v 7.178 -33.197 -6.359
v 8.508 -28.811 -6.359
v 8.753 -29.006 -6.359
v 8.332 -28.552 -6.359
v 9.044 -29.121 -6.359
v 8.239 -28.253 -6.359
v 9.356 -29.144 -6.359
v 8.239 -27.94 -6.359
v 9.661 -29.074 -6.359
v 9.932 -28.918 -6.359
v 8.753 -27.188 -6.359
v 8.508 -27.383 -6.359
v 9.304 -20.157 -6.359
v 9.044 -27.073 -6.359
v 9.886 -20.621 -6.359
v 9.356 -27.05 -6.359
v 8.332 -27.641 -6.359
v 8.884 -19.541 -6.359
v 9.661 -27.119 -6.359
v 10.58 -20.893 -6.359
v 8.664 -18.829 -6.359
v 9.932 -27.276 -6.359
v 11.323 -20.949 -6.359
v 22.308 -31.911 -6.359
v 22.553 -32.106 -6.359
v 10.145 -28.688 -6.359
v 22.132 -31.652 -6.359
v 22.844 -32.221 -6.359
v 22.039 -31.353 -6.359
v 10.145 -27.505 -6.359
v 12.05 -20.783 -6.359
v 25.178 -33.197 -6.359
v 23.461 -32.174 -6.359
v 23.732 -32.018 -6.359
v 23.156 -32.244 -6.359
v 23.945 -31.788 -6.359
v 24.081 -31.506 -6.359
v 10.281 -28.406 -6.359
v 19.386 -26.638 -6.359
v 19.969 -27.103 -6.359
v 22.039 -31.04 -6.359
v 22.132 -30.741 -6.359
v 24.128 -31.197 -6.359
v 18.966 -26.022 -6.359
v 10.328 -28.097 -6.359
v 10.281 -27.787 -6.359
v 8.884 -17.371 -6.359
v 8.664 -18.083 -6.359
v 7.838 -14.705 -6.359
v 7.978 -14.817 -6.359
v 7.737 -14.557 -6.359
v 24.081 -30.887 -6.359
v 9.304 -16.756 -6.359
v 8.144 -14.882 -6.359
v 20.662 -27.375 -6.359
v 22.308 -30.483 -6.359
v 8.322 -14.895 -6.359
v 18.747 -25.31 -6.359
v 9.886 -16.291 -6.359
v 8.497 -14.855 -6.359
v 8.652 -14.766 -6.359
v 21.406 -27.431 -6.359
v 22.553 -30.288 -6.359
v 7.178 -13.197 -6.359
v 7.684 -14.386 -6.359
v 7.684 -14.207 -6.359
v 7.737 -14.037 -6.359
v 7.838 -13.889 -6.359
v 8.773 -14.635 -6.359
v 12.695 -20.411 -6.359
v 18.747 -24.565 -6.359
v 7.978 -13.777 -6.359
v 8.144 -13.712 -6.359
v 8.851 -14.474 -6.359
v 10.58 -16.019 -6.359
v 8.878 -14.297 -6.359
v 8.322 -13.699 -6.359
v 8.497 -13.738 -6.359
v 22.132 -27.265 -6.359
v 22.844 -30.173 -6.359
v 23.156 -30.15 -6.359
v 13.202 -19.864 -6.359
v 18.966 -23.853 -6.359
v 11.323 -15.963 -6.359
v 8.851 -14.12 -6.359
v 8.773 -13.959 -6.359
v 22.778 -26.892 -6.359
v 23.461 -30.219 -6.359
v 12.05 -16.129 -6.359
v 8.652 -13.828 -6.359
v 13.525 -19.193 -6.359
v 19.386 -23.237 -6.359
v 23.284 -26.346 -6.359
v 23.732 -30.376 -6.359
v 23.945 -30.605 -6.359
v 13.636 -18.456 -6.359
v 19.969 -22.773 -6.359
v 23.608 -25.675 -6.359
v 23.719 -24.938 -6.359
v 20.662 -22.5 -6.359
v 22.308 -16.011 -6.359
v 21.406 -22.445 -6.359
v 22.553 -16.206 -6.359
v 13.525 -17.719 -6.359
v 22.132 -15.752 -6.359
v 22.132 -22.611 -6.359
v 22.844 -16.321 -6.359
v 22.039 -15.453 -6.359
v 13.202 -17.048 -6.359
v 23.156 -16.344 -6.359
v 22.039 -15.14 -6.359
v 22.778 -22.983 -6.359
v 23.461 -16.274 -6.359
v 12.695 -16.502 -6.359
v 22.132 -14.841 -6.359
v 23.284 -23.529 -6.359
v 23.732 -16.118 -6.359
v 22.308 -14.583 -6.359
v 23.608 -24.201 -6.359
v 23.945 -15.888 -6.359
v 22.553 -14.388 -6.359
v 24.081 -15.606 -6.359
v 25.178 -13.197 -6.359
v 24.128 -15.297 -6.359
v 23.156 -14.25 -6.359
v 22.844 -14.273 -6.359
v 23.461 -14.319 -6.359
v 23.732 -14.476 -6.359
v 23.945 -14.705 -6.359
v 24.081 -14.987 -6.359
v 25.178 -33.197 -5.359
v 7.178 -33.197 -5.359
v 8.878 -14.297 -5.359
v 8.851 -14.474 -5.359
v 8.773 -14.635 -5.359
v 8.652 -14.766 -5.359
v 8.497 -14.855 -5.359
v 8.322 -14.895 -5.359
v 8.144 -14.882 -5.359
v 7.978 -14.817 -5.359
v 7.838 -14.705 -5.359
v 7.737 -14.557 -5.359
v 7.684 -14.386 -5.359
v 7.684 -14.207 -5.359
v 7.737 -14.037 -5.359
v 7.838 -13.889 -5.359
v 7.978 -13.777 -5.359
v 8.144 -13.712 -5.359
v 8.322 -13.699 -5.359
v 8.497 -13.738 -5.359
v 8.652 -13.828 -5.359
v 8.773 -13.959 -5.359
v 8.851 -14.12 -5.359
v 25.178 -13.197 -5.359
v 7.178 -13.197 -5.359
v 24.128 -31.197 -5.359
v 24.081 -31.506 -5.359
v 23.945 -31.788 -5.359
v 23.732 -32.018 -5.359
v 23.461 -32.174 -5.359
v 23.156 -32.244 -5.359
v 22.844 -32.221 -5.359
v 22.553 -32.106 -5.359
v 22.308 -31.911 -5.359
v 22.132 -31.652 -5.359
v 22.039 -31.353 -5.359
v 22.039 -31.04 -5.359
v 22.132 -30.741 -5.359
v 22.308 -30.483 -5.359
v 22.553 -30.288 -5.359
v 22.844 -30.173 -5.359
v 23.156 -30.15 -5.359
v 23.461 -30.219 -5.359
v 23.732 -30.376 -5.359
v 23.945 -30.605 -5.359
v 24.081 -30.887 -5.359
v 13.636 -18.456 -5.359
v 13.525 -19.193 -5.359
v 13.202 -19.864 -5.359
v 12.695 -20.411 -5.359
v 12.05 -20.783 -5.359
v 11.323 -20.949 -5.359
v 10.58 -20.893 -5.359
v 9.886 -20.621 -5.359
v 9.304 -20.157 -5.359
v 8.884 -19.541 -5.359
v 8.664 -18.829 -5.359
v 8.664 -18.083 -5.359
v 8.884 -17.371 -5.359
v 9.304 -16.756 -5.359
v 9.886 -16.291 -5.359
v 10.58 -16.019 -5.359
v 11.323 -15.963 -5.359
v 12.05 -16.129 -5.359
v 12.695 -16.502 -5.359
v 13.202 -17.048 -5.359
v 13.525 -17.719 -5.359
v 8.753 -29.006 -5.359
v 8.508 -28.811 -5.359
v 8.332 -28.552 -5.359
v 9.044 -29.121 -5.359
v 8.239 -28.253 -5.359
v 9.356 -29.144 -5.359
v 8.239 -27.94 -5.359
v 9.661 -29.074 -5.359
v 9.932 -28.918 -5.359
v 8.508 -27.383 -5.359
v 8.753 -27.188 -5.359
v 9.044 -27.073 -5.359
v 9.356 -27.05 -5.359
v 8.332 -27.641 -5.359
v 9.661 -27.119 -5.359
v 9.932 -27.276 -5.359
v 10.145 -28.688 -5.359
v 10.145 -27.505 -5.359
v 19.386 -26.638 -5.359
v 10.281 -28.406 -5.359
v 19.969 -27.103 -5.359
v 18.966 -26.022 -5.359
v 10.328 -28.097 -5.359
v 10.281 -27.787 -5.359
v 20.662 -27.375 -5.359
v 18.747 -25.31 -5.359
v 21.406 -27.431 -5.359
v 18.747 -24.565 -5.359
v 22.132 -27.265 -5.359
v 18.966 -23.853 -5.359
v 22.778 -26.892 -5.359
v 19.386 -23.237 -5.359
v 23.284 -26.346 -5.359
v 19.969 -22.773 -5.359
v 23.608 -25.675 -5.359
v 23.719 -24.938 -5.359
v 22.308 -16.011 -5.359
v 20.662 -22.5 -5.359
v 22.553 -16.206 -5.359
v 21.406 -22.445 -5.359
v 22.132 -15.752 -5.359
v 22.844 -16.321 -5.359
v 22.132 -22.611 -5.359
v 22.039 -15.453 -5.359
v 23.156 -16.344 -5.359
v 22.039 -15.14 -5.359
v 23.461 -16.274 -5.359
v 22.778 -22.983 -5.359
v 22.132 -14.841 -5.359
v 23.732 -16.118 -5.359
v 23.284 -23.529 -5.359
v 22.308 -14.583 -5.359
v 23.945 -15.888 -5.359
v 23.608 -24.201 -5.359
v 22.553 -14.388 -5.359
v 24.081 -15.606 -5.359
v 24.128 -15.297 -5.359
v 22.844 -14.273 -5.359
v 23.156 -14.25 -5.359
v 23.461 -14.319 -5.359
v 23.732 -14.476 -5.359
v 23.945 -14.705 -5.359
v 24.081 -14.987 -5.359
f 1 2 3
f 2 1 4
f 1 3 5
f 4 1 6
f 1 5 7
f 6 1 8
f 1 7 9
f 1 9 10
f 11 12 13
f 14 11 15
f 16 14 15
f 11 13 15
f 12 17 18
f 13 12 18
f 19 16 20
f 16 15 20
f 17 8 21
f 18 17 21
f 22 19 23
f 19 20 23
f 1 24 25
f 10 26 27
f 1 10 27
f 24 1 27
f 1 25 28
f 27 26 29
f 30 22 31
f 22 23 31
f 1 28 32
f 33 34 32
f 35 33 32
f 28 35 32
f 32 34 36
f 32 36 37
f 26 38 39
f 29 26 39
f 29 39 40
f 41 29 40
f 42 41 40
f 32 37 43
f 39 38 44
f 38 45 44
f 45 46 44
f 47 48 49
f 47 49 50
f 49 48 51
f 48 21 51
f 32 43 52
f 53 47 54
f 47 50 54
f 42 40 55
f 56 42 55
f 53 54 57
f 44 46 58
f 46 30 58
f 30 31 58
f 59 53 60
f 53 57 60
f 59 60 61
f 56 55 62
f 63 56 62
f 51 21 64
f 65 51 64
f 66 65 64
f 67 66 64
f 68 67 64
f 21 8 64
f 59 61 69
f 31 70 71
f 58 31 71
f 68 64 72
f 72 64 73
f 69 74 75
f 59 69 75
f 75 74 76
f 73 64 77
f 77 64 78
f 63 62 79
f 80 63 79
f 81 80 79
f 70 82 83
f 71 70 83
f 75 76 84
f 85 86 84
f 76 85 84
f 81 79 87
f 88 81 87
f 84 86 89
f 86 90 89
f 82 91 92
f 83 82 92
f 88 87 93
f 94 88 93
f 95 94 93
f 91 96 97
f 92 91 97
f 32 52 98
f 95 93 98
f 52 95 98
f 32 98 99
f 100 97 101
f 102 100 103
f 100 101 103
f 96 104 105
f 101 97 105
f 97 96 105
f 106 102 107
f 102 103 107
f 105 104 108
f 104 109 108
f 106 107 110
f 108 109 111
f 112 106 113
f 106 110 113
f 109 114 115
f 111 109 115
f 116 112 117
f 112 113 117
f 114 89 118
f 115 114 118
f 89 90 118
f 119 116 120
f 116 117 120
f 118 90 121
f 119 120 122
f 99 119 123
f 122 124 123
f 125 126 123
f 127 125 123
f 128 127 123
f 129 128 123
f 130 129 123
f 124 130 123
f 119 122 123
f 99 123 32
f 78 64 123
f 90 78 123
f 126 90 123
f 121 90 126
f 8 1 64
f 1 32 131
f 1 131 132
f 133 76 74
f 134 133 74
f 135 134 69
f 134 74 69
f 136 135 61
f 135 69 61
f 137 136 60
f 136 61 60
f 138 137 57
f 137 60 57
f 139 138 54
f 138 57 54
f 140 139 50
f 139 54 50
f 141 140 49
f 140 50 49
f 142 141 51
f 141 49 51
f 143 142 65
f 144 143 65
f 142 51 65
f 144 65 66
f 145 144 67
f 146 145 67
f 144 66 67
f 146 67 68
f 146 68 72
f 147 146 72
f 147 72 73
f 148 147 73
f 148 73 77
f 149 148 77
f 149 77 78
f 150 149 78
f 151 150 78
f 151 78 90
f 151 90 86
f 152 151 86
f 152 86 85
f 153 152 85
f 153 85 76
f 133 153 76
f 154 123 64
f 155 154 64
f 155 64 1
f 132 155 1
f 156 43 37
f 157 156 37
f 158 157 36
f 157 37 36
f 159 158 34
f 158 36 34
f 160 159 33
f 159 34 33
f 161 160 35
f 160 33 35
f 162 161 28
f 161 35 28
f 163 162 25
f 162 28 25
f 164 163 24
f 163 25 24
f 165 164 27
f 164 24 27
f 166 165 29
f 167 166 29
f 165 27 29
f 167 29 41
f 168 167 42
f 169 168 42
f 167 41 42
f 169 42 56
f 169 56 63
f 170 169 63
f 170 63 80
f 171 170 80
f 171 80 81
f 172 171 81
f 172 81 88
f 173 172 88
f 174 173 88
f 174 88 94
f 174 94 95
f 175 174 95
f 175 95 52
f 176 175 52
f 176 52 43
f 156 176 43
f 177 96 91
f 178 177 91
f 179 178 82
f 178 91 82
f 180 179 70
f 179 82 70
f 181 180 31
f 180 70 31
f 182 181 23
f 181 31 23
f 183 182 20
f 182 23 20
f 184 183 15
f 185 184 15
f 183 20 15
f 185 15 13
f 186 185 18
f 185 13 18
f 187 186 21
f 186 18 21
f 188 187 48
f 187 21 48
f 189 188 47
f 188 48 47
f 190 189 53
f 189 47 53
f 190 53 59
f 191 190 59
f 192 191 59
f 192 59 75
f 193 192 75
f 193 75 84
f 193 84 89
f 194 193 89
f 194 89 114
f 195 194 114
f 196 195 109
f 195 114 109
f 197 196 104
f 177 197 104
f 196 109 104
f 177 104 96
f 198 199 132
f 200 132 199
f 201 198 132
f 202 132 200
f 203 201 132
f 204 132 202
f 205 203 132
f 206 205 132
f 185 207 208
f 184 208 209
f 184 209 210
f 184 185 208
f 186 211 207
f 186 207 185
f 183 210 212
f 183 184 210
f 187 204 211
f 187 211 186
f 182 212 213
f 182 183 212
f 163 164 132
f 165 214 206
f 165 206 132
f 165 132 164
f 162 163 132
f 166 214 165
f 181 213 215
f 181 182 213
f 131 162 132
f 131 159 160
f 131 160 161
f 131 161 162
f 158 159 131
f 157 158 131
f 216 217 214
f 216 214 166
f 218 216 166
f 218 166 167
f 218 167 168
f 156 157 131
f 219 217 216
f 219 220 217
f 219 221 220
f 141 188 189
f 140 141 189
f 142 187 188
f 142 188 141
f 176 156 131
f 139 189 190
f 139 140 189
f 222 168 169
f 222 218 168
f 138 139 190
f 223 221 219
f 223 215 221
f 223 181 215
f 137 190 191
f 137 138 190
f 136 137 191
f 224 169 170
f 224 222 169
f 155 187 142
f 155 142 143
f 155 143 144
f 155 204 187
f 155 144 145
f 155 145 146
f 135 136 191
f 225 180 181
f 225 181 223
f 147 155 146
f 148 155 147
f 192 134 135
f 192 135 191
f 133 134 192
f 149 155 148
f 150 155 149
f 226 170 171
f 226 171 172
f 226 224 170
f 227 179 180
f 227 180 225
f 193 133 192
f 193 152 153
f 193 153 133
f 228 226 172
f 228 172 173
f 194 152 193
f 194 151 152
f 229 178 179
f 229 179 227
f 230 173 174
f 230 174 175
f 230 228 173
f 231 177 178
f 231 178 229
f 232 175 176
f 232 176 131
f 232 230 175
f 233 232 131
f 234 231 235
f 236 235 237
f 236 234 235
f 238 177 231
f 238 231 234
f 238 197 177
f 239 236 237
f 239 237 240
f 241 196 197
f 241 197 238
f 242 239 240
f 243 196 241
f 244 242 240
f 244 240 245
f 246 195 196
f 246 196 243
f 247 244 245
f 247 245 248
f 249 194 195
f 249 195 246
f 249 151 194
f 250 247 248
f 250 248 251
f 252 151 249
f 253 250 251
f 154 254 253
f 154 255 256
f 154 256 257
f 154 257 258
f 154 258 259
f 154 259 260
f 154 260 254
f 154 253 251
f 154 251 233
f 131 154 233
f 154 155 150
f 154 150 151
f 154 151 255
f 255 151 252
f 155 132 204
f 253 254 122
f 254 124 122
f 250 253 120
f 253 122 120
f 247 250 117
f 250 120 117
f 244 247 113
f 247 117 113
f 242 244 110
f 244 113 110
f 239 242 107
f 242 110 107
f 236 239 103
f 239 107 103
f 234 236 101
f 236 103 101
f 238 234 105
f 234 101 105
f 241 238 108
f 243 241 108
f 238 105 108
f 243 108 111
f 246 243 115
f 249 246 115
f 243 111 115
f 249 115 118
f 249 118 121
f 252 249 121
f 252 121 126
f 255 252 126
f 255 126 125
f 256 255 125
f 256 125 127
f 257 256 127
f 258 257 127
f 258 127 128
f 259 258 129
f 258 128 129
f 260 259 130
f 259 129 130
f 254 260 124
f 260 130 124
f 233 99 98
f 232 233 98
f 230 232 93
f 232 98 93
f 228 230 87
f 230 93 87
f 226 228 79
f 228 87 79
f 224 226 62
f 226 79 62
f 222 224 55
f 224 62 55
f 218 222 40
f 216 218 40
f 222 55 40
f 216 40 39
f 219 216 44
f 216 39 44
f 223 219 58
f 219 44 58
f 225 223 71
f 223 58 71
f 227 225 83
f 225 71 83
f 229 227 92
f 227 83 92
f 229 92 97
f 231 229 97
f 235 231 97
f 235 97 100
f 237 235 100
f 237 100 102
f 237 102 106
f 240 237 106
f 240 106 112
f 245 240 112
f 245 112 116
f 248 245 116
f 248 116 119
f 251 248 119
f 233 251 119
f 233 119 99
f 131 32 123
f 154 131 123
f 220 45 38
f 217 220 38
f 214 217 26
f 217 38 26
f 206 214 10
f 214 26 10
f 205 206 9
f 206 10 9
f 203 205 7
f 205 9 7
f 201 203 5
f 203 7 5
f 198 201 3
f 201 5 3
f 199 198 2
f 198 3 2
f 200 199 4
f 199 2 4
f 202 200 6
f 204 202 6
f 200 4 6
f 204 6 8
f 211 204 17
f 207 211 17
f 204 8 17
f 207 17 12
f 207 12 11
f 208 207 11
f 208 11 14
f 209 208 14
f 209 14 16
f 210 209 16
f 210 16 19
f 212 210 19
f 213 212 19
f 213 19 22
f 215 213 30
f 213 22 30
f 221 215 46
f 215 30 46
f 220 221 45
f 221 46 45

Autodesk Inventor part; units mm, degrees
ref_plane "YZ Plane" through (0, 0, 0) normal (1, 0, 0) x (0, 1, 0)
ref_plane "XZ Plane" through (0, 0, 0) normal (0, 1, 0) x (-1, 0, 0)
ref_plane "Work Plane1" through (-8, -18, 2.25) normal (0, 0, 1) x (1, 0, 0)
ref_plane "Work Plane2" through (16.1776, -21.6969, -6.3588) normal (0, 0, 1) x (1, 0, 0)
sketch "Sketch6" plane through (16.1776, -21.6969, -6.3588) normal (0, 0, 1) x (1, 0, 0)
  circle A0 centre (6.9, -9.5) radius 1.2 projected
  circle A1 centre (-6.9, -6.4) radius 1.2 projected
  circle A2 centre (6.9, 6.4) radius 1.2 projected
  circle A3 centre (-7.9, 7.4) radius 0.4 projected
  line L0 (4.2, -7) -> (-1.2, -7) projected
  arc A4 (-8.5, 0.3) -> (-1.2, -7) centre (-1.2, 0.3) ccw projected
  line L1 (-8.5, 0.3) -> (-8.5, 2.7) projected
  arc A5 (-4.2, 7) -> (-8.5, 2.7) centre (-4.2, 2.7) ccw projected
  line L2 (-4.2, 7) -> (1.2, 7) projected
  arc A6 (8.5, -0.3) -> (1.2, 7) centre (1.2, -0.3) ccw projected
  line L3 (8.5, -0.3) -> (8.5, -2.7) projected
  arc A7 (4.2, -7) -> (8.5, -2.7) centre (4.2, -2.7) ccw projected
  line L4 (-4.2738, -7.5) -> (-4.2738, -24.5) projected
  line L5 (-4.2738, -7.5) -> (4.2738, -7.5) projected
  line L6 (4.2738, -24.5) -> (4.2738, -7.5) projected
  line L7 (9, -24.5) -> (4.2738, -24.5) projected
  line L8 (9, -24.5) -> (9, 8.5) projected
  line L9 (9, 8.5) -> (-9, 8.5) projected
  line L10 (-9, 8.5) -> (-9, -24.5) projected
  line L11 (-4.2738, -24.5) -> (-9, -24.5) projected
  line L12 (1.2, 6.2) -> (-4.2, 6.2) projected
  arc A8 (-4.2, 6.2) -> (-7.7, 2.7) centre (-4.2, 2.7) ccw projected
  line L13 (-7.7, 2.7) -> (-7.7, 0.3) projected
  arc A9 (-7.7, 0.3) -> (-1.2, -6.2) centre (-1.2, 0.3) ccw projected
  line L14 (-1.2, -6.2) -> (4.2, -6.2) projected
  arc A10 (4.2, -6.2) -> (7.7, -2.7) centre (4.2, -2.7) ccw projected
  line L15 (7.7, -2.7) -> (7.7, -0.3) projected
  arc A11 (7.7, -0.3) -> (1.2, 6.2) centre (1.2, -0.3) ccw projected
  line L16 (-7.2, 0.3) -> (-7.2, 2.7) projected
  arc A12 (-4.2, 5.7) -> (-7.2, 2.7) centre (-4.2, 2.7) ccw projected
  line L17 (-4.2, 5.7) -> (1.2, 5.7) projected
  arc A13 (7.2, -0.3) -> (1.2, 5.7) centre (1.2, -0.3) ccw projected
  line L18 (7.2, -0.3) -> (7.2, -2.7) projected
  arc A14 (4.2, -5.7) -> (7.2, -2.7) centre (4.2, -2.7) ccw projected
  line L19 (4.2, -5.7) -> (-1.2, -5.7) projected
  arc A15 (-7.2, 0.3) -> (-1.2, -5.7) centre (-1.2, 0.3) ccw projected
  line L20 (8.5, -0.3) -> (8.5, -2.7) projected
  arc A16 (8.5, -0.3) -> (1.2, 7) centre (1.2, -0.3) ccw projected
  line L21 (-4.2, 7) -> (1.2, 7) projected
  arc A17 (-4.2, 7) -> (-8.5, 2.7) centre (-4.2, 2.7) ccw projected
  line L22 (-8.5, 0.3) -> (-8.5, 2.7) projected
  arc A18 (-8.5, 0.3) -> (-1.2, -7) centre (-1.2, 0.3) ccw projected
  line L23 (4.2, -7) -> (-1.2, -7) projected
  arc A19 (4.2, -7) -> (8.5, -2.7) centre (4.2, -2.7) ccw projected
  arc A20 (-4.2, 6.2) -> (-7.7, 2.7) centre (-4.2, 2.7) ccw projected
  line L24 (1.2, 6.2) -> (-4.2, 6.2) projected
  arc A21 (7.7, -0.3) -> (1.2, 6.2) centre (1.2, -0.3) ccw projected
  line L25 (7.7, -2.7) -> (7.7, -0.3) projected
  arc A22 (4.2, -6.2) -> (7.7, -2.7) centre (4.2, -2.7) ccw projected
  line L26 (-1.2, -6.2) -> (4.2, -6.2) projected
  arc A23 (-7.7, 0.3) -> (-1.2, -6.2) centre (-1.2, 0.3) ccw projected
  line L27 (-7.7, 2.7) -> (-7.7, 0.3) projected
  line L28 (-1.4516, 1.7) -> (-0.5158, 1.7) projected
  arc A24 (2.07, 0.2211) -> (-0.5158, 1.7) centre (-0.5158, -1.3) ccw projected
  line L29 (2.07, 0.2211) -> (2.3135, -0.193) projected
  arc A25 (1.4516, -1.7) -> (2.3135, -0.193) centre (1.4516, -0.7) ccw projected
  line L30 (1.4516, -1.7) -> (0.5158, -1.7) projected
  arc A26 (-2.07, -0.2211) -> (0.5158, -1.7) centre (0.5158, 1.3) ccw projected
  line L31 (-2.07, -0.2211) -> (-2.3135, 0.193) projected
  arc A27 (-1.4516, 1.7) -> (-2.3135, 0.193) centre (-1.4516, 0.7) ccw projected
  arc A28 (-7.2, 0.3) -> (-1.2, -5.7) centre (-1.2, 0.3) ccw projected
  line L32 (-1.2, -5.7) -> (4.2, -5.7) projected
  arc A29 (4.2, -5.7) -> (7.2, -2.7) centre (4.2, -2.7) ccw projected
  line L33 (7.2, -2.7) -> (7.2, -0.3) projected
  arc A30 (7.2, -0.3) -> (1.2, 5.7) centre (1.2, -0.3) ccw projected
  line L34 (1.2, 5.7) -> (-4.2, 5.7) projected
  arc A31 (-4.2, 5.7) -> (-7.2, 2.7) centre (-4.2, 2.7) ccw projected
  line L35 (-7.2, 2.7) -> (-7.2, 0.3) projected
  line L36 (-9, 8.5) -> (9, 8.5)
  line L37 (9, 8.5) -> (9, -11.5)
  line L38 (9, -11.5) -> (-9, -11.5)
  line L39 (-9, -11.5) -> (-9, 8.5)
  circle A32 centre (-6.9, -6.4) radius 1.05
  circle A33 centre (6.9, -9.5) radius 1.05
  circle A34 centre (6.9, 6.4) radius 1.05
  circle A35 centre (-7.9, 7.4) radius 0.6
  circle A36 centre (-7.9, 7.4) radius 2.25
  line L40 (-4.2, 2.7) -> (4.2, -2.7)
  line L41 (-4.2, 2.7) -> (-5.0412, 3.2408)
  line L42 (4.2, -2.7) -> (5.0412, -3.2408)
  circle A37 centre (-5.0412, 3.2408) radius 2.5
  circle A38 centre (5.0412, -3.2408) radius 2.5
  point P0 (-16.1776, 21.6969)
  point P1 (-9, -11.5)
  dimension "d36" = 20
  dimension "d37" = 2.1
  dimension "d38" = 2.1
  dimension "d39" = 2.1
  dimension "d40" = 1.2
  dimension "d41" = 4.5
  dimension "d42" = 1
  dimension "d43" = 1
  dimension "d44" = 5
  dimension "d45" = 5
extrude "Extrusion4" add sketch "Sketch6" along normal blind 3 contours A0 | A1 | A2 | A7 L3 A6 L2 A5 A36 L9 L8 L38 L6 L5 L4 L10 L1 A4 L0 | L0 A4 L1 A5 A36 L2 A6 L3 A7 | A36 L10 L9 A5 | A5 A36 | L4 L5 L6 L38 | A11 L15 A10 A38 L18 A13 L17 A12 A37 A8 L12 | A37 L16 A15 L19 A14 A38 A10 L14 A9 L13 A8 | A12 L17 A13 L18 A38 L40 A25 L29 A24 L28 A27 A37 | A37 L40 A27 L31 A26 L30 A25 A38 A14 L19 A15 L16 | L40 A25 L30 A26 L31 A27 | A27 L28 A24 L29 A25 L40
move faces "Move2" translate (0, 0, -2) faces at (13.0665, -31.2809, -3.3588)
properties part number "water line connector"
